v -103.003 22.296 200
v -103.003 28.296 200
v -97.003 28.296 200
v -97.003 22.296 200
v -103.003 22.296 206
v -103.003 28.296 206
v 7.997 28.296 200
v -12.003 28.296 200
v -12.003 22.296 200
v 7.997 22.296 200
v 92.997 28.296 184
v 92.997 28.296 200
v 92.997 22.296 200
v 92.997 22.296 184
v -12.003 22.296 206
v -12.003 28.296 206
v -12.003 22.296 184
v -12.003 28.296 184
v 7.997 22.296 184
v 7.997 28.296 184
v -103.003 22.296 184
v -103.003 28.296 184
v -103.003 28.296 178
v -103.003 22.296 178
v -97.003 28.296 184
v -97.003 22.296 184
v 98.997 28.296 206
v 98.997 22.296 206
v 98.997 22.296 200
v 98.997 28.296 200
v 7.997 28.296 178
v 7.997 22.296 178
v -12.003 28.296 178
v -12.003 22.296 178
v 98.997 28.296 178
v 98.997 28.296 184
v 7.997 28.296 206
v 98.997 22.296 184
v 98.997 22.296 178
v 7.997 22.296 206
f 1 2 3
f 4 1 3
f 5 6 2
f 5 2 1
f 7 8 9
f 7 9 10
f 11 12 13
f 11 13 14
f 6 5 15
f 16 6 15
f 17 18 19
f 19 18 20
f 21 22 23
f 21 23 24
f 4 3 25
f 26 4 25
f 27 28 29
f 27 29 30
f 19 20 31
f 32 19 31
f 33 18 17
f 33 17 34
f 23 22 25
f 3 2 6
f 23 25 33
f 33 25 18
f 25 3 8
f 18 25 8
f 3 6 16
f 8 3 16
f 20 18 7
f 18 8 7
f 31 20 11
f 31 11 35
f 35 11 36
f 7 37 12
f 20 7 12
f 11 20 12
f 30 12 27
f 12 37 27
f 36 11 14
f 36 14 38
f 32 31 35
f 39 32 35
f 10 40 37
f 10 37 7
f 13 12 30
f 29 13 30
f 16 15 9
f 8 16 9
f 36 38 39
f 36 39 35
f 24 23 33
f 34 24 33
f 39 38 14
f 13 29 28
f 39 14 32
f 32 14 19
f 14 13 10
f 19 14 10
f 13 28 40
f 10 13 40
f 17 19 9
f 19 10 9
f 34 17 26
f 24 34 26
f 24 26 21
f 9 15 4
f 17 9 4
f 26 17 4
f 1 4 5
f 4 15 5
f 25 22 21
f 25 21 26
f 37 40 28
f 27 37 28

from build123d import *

# Parameters (mm, degrees)
ESQUISSE2_W             = 91
ESQUISSE2_H             = 6
BOSS_EXTRU_1_DEPTH      = 6
BOSS_EXTRU_1_2_DEPTH    = 6
BOSS_EXTRU_2_DEPTH      = 22
ESQUISSE4_W             = 20
ESQUISSE4_H             = 6
ENL_V_MAT_EXTRU_1_DEPTH = 6
ESQUISSE5_W             = 6
ESQUISSE5_H             = 16
ENL_V_MAT_EXTRU_2_DEPTH = 6


with BuildPart() as part:
    # Esquisse2 → Boss.-Extru.1 (new body)
    with BuildSketch(Plane(origin=(0, 22.295844579, 0), x_dir=(1, 0, 0), z_dir=(0, 1, 0))):
        with Locations((-57.503078089, -203.00005)):
            Rectangle(ESQUISSE2_W, ESQUISSE2_H)
    extrude(amount=BOSS_EXTRU_1_DEPTH)



with BuildPart() as body_2:
    # Esquisse2 → Boss.-Extru.1 2 (new body)
    with BuildSketch(Plane(origin=(0, 22.295844579, 0), x_dir=(1, 0, 0), z_dir=(0, 1, 0))):
        with Locations((53.496921911, -203.00005)):
            Rectangle(ESQUISSE2_W, ESQUISSE2_H)
    extrude(amount=BOSS_EXTRU_1_2_DEPTH)


with BuildPart() as part_1:
    add(part.part)

    add(body_2.part)  # Boss.-Extru.2 merges body 2
    # Esquisse3 → Boss.-Extru.2 (add)
    with BuildSketch(Plane(origin=(0, 0, 200.00005), x_dir=(-1, 0, 0), z_dir=(0, 0, -1))):
        Polygon((-7.996921911, 28.295844579), (12.003078089, 28.295844579), (103.003078089, 28.295844579), (103.003078089, 22.295844579), (12.003078089, 22.295844579), (-7.996921911, 22.295844579), (-98.996921911, 22.295844579), (-98.996921911, 28.295844579), align=None)
    extrude(amount=BOSS_EXTRU_2_DEPTH)

    # Esquisse4 → Enlèv. mat.-Extru.1 (cut)
    with BuildSketch(Plane(origin=(0, 28.295844579, 0), x_dir=(1, 0, 0), z_dir=(0, 1, 0))):
        with Locations((-2.003078089, -203.00005)):
            Rectangle(ESQUISSE4_W, ESQUISSE4_H)
        with Locations((-2.003078089, -181.00005)):
            Rectangle(ESQUISSE4_W, ESQUISSE4_H)
    extrude(amount=-ENL_V_MAT_EXTRU_1_DEPTH, mode=Mode.SUBTRACT)

    # Esquisse5 → Enlèv. mat.-Extru.2 (cut)
    with BuildSketch(Plane(origin=(0, 28.295844579, 0), x_dir=(1, 0, 0), z_dir=(0, 1, 0))):
        with Locations((95.996921911, -192.00005)):
            Rectangle(ESQUISSE5_W, ESQUISSE5_H)
        with Locations((-100.003078089, -192.00005)):
            Rectangle(ESQUISSE5_W, ESQUISSE5_H)
    extrude(amount=-ENL_V_MAT_EXTRU_2_DEPTH, mode=Mode.SUBTRACT)


solid = part_1.part
